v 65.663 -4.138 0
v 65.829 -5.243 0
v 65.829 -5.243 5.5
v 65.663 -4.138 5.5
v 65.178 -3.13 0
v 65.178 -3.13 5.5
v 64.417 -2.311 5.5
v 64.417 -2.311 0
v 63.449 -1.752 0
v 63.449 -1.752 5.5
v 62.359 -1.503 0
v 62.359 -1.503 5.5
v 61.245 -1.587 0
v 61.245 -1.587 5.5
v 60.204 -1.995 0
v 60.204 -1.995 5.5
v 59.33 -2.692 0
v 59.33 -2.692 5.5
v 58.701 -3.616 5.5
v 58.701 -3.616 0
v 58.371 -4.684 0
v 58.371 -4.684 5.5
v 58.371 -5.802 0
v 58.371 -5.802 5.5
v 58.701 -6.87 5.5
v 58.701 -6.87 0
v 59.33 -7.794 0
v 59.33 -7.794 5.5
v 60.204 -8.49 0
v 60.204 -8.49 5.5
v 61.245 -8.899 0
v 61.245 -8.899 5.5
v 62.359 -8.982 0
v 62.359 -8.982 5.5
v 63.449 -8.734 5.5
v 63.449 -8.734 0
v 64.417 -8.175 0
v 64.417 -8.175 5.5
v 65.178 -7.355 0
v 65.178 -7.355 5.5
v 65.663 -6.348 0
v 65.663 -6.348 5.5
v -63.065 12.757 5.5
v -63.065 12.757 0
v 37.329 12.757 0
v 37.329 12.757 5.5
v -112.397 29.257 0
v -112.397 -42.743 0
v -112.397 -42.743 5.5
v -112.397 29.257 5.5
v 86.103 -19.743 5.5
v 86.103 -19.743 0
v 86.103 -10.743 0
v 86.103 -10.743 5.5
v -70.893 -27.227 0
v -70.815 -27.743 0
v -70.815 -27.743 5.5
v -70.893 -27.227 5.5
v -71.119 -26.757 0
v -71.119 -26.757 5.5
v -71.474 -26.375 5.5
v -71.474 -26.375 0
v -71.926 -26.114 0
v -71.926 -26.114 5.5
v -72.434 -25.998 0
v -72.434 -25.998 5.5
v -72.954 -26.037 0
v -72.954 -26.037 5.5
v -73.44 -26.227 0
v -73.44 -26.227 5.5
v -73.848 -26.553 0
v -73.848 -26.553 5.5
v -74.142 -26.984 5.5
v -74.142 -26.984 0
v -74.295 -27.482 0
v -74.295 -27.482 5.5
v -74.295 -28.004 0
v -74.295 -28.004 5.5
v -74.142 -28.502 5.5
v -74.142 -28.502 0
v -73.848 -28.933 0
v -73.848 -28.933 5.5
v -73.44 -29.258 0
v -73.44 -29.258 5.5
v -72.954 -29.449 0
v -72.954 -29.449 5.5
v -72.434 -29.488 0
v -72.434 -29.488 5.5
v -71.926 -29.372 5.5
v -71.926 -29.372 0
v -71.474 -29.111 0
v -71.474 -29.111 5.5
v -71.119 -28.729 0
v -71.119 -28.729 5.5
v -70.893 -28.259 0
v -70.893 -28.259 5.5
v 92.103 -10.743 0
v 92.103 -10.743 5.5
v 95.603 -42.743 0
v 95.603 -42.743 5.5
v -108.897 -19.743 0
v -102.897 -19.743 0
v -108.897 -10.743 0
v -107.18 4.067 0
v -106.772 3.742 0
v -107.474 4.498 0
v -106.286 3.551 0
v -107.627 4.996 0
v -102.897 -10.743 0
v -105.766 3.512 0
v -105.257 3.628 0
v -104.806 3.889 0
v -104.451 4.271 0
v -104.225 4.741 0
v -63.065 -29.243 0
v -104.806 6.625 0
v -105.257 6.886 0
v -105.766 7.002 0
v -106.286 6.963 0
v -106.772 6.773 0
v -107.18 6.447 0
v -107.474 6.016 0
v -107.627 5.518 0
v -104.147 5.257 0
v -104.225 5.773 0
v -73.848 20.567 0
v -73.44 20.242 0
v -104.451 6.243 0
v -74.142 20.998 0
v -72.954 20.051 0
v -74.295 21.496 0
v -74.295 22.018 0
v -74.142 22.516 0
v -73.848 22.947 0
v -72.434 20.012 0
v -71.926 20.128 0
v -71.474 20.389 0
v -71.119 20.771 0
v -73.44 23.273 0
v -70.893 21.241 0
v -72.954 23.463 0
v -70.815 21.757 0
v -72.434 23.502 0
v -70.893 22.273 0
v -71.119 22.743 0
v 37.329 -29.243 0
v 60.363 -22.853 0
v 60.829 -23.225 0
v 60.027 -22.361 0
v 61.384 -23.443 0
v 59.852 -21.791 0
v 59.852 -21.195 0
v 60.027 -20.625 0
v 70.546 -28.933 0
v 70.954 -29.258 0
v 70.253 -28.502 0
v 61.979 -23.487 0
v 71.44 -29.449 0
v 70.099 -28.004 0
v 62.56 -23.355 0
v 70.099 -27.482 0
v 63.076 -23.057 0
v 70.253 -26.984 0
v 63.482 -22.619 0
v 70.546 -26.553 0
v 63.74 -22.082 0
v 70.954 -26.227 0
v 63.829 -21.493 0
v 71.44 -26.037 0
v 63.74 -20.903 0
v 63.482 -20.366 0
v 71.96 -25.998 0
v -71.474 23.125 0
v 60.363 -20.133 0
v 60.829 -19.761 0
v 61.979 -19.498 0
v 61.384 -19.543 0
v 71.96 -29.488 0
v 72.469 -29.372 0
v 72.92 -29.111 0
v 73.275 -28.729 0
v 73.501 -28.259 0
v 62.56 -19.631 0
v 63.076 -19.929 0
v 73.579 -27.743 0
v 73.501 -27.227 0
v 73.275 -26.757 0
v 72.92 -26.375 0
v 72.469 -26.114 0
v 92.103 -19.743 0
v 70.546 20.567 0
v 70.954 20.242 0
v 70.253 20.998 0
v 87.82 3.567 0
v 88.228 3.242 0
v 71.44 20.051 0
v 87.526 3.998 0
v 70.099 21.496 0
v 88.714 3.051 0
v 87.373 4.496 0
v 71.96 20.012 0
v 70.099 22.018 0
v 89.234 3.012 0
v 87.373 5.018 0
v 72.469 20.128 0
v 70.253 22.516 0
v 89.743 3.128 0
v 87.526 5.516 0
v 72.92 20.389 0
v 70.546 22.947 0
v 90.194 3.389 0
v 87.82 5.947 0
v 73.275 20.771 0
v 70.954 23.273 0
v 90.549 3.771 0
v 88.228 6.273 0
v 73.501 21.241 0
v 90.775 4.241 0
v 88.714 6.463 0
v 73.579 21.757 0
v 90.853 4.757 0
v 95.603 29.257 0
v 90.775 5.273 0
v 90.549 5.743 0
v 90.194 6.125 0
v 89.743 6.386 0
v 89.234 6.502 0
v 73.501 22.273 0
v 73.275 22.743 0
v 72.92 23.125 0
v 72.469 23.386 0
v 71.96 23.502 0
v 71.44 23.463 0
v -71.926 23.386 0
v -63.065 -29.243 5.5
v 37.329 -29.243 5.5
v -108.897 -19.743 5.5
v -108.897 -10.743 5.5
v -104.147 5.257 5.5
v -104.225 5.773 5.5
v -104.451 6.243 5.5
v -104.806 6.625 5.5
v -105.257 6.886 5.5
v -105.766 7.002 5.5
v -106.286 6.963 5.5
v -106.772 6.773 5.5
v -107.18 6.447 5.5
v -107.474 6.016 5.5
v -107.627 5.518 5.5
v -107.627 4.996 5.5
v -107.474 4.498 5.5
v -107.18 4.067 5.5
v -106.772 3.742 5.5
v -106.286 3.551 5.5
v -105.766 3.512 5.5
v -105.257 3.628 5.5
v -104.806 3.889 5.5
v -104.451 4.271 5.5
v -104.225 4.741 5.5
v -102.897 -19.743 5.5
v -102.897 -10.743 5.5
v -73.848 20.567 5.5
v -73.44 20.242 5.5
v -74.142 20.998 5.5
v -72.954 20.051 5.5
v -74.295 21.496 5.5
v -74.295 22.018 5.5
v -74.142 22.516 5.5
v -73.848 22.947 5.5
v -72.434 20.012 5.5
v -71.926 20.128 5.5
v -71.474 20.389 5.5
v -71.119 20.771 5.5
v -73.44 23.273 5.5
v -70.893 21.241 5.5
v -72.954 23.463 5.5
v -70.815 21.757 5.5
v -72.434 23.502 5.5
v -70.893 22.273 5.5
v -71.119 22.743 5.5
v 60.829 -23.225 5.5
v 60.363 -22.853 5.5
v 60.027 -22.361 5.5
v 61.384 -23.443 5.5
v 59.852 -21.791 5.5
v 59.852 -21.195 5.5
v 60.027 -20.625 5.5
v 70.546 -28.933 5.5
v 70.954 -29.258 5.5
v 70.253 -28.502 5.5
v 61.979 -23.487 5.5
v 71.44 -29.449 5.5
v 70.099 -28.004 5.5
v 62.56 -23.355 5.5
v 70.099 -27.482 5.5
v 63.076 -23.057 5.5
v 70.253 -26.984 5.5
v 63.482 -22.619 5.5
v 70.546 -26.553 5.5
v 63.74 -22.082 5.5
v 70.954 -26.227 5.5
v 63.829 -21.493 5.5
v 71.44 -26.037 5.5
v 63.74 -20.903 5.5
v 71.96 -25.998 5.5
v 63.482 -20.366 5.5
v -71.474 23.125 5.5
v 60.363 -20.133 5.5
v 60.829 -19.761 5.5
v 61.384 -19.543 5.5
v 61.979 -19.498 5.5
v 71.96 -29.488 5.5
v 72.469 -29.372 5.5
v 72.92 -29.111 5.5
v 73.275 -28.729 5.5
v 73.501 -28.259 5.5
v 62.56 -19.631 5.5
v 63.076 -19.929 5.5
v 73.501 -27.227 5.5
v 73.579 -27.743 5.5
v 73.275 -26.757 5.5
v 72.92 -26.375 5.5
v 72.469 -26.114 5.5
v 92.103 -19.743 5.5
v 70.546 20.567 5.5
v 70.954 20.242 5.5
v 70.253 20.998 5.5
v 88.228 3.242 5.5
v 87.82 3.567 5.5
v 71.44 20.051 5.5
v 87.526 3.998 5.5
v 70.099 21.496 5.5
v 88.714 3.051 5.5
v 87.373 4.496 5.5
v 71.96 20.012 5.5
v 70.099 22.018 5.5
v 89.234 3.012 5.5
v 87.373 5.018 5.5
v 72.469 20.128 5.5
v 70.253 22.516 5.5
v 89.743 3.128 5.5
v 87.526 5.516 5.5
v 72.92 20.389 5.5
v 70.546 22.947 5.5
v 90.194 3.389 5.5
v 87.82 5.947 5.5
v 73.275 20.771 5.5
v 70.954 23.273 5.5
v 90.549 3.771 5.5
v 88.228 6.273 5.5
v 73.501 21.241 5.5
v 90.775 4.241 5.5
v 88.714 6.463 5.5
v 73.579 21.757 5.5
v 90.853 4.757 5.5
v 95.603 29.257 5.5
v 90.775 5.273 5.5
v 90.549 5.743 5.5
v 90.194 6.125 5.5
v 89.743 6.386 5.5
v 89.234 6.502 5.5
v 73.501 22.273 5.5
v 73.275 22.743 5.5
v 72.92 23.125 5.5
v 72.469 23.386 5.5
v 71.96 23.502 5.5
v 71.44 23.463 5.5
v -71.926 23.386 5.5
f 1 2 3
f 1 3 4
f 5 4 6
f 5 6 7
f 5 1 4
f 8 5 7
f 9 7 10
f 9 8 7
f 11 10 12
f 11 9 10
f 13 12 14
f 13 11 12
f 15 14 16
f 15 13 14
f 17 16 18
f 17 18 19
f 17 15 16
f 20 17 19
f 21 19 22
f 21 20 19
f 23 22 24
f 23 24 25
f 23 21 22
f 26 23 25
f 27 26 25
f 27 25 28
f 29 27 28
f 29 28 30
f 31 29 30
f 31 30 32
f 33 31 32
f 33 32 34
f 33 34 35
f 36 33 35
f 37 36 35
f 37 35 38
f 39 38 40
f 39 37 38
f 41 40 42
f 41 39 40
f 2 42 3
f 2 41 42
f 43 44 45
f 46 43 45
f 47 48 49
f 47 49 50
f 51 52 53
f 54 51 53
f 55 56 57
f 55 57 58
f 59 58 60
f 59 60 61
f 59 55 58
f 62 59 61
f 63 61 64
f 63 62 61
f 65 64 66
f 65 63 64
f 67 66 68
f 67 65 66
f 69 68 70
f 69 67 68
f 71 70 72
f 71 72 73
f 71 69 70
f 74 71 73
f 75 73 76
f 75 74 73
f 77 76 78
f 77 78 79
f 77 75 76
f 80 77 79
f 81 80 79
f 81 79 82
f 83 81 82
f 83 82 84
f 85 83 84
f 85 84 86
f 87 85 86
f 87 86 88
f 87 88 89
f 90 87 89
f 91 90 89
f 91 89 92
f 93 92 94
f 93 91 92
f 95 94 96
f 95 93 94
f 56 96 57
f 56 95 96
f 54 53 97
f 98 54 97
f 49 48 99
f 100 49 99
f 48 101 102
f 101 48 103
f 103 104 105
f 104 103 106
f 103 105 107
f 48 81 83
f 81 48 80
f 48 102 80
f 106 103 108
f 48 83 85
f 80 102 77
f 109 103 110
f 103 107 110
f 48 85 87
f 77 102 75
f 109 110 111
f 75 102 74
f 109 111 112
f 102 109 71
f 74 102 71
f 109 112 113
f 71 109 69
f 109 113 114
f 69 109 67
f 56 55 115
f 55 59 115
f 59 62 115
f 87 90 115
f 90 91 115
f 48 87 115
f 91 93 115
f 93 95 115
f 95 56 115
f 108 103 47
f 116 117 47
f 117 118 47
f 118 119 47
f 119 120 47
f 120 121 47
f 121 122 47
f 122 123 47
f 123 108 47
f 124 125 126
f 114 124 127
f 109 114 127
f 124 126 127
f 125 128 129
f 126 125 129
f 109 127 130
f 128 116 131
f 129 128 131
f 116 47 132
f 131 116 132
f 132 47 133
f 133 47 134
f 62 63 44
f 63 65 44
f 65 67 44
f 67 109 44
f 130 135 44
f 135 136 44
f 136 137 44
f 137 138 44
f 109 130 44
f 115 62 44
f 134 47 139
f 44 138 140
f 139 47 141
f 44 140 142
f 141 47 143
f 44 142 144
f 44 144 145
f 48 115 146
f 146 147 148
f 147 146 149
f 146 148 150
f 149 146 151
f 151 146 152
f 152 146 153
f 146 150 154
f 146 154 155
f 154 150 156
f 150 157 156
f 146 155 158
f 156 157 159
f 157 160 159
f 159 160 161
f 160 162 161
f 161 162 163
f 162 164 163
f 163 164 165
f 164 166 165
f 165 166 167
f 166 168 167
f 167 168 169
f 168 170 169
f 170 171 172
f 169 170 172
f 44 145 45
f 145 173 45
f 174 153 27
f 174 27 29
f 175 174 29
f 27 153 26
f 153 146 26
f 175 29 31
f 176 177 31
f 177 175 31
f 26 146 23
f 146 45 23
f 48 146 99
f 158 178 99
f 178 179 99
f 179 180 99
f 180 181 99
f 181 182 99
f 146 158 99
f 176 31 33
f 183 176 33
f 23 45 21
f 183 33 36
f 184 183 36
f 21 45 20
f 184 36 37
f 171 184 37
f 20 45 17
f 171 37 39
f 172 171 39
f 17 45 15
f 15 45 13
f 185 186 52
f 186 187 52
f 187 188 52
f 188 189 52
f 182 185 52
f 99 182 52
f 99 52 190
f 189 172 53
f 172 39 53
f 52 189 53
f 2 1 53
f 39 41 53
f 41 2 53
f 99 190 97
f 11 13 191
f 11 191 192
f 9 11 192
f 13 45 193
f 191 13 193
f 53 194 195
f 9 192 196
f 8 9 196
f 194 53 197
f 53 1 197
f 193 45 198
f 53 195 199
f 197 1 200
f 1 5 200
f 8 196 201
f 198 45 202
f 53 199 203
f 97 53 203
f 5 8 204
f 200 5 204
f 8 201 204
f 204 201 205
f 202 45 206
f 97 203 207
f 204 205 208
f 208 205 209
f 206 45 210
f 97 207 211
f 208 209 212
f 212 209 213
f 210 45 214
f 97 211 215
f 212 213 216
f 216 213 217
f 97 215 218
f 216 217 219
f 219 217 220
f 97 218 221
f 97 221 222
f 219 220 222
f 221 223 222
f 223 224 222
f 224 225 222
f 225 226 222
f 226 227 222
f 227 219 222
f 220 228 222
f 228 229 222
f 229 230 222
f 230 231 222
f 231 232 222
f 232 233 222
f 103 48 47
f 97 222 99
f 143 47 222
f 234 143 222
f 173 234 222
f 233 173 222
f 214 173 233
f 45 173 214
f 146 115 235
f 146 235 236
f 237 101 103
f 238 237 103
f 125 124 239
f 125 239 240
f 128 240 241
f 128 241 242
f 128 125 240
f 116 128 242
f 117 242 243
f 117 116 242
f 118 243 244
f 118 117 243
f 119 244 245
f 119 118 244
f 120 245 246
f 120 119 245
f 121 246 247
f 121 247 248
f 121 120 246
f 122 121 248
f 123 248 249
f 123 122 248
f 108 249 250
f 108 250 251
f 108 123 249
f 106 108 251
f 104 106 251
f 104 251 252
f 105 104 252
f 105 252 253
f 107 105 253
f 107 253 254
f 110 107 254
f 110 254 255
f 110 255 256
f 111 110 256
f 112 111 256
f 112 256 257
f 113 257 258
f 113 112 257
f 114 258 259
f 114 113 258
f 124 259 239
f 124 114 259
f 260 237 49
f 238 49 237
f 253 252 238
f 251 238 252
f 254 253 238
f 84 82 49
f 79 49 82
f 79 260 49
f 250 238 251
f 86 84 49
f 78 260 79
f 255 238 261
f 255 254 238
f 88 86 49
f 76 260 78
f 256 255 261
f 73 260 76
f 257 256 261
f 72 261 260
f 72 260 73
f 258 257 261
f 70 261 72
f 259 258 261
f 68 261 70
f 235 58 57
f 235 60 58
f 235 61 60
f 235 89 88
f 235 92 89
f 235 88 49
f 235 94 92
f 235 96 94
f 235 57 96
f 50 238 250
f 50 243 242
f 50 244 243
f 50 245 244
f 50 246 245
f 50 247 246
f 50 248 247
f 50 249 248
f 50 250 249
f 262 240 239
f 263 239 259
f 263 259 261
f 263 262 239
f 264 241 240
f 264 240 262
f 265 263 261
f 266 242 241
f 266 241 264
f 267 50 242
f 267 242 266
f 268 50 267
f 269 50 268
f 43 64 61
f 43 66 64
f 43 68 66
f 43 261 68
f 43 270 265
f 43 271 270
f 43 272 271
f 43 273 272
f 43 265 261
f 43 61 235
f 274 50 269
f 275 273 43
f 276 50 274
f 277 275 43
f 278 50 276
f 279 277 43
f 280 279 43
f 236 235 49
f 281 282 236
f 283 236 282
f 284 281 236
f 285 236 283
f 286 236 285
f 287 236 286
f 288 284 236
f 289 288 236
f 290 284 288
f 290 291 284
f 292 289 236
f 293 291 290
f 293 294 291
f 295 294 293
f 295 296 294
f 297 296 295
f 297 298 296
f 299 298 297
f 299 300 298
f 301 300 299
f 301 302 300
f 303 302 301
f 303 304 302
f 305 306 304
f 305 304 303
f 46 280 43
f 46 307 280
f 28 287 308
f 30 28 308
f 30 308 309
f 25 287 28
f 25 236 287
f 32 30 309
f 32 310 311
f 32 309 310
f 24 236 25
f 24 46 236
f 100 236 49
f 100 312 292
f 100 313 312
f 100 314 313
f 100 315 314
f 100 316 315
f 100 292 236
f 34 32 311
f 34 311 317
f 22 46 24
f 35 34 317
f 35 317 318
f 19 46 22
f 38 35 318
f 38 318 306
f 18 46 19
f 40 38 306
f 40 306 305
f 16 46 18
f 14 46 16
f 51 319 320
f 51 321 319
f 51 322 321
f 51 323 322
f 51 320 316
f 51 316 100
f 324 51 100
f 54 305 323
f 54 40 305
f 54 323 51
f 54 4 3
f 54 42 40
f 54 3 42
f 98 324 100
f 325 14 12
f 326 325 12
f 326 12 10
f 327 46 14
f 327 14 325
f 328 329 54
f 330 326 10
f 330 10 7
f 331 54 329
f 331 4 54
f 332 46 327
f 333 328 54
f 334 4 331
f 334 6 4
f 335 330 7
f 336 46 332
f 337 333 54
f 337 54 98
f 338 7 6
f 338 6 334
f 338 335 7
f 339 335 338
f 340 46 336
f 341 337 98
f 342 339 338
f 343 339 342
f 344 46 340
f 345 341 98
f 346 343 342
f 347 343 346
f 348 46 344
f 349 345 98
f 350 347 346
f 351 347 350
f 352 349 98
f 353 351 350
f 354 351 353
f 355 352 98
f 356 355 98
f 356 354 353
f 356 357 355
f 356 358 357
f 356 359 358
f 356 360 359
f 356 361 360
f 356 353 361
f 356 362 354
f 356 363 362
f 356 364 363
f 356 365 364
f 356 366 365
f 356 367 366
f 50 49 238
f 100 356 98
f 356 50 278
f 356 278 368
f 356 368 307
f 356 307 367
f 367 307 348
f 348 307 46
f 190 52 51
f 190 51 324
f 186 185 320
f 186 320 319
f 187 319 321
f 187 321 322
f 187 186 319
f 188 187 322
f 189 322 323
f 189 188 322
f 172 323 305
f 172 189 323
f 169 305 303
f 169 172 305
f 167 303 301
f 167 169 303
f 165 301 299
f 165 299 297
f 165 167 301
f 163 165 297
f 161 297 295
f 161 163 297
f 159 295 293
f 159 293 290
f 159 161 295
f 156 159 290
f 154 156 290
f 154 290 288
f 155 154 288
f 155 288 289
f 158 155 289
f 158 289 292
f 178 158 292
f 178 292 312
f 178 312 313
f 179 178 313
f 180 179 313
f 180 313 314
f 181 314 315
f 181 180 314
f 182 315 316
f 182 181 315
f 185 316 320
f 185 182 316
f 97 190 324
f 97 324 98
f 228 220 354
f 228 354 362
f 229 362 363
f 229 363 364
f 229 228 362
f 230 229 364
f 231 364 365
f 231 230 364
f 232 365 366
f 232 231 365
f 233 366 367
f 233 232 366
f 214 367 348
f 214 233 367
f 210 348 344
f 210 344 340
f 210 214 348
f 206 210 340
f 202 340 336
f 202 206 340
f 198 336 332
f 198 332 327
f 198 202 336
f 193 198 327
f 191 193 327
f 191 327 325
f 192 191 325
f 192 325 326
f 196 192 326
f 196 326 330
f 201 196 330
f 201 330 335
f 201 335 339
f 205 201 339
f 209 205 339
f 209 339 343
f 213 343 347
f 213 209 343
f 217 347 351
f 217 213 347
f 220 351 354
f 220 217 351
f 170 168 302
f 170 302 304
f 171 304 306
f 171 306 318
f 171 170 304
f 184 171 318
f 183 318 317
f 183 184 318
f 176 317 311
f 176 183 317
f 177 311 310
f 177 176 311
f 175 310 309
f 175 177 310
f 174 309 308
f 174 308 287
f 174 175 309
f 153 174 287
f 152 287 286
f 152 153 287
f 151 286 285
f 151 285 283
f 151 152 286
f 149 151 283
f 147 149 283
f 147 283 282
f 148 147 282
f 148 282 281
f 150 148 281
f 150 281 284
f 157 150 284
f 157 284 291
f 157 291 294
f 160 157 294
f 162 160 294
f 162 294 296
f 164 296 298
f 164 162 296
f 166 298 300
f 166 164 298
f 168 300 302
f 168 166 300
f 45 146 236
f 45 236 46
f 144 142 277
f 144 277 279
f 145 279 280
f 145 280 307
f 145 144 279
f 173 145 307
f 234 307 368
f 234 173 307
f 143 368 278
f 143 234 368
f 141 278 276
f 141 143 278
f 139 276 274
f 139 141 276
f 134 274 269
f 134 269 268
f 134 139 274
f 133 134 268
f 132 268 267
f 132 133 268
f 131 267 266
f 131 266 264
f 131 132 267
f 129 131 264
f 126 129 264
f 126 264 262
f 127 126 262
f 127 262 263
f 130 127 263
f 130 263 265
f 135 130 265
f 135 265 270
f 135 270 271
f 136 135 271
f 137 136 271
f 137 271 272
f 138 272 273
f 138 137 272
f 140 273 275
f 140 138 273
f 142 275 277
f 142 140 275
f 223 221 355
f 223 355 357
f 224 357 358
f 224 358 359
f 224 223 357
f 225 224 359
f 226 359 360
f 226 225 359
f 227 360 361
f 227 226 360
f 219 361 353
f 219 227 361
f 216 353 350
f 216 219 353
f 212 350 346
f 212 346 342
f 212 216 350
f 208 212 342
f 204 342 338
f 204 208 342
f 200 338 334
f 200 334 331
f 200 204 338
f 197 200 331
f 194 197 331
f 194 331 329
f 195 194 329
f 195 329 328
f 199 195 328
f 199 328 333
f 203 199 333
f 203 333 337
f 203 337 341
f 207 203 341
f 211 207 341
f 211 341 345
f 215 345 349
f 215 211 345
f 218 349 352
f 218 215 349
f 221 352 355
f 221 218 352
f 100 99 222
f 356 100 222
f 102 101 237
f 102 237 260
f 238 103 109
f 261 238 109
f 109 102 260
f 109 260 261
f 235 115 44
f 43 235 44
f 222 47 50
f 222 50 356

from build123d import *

# Parameters (mm, degrees)
F0_W     = 208
F0_H     = 72
F0_R     = 1.75
F0_W_2   = 6
F0_H_2   = 9
F0_W_3   = 100.394129
F0_H_3   = 42
F0_R_2   = 2
F0_R_3   = 3.75
F1_DEPTH = 5.5


with BuildPart() as f1:
    # F0 (on Top) → F1 (new body)
    with BuildSketch(Plane.XY):
        with Locations((-8.396824, -6.742854)):
            Rectangle(F0_W, F0_H)
        with Locations((-72.564889, -27.742854)):
            Circle(F0_R, mode=Mode.SUBTRACT)
        with Locations((-105.896824, -15.242854)):
            Rectangle(F0_W_2, F0_H_2, mode=Mode.SUBTRACT)
        with Locations((-12.867824, -8.242854)):
            Rectangle(F0_W_3, F0_H_3, mode=Mode.SUBTRACT)
        with Locations((71.82924, -27.742854)):
            Circle(F0_R, mode=Mode.SUBTRACT)
        with Locations((61.82924, -21.492854)):
            Circle(F0_R_2, mode=Mode.SUBTRACT)
        with Locations((89.103176, -15.242854)):
            Rectangle(F0_W_2, F0_H_2, mode=Mode.SUBTRACT)
        with Locations((-105.896824, 5.257146)):
            Circle(F0_R, mode=Mode.SUBTRACT)
        with Locations((-72.564889, 21.757146)):
            Circle(F0_R, mode=Mode.SUBTRACT)
        with Locations((62.07924, -5.242854)):
            Circle(F0_R_3, mode=Mode.SUBTRACT)
        with Locations((89.103176, 4.757146)):
            Circle(F0_R, mode=Mode.SUBTRACT)
        with Locations((71.82924, 21.757146)):
            Circle(F0_R, mode=Mode.SUBTRACT)
    extrude(amount=F1_DEPTH)


solid = f1.part
